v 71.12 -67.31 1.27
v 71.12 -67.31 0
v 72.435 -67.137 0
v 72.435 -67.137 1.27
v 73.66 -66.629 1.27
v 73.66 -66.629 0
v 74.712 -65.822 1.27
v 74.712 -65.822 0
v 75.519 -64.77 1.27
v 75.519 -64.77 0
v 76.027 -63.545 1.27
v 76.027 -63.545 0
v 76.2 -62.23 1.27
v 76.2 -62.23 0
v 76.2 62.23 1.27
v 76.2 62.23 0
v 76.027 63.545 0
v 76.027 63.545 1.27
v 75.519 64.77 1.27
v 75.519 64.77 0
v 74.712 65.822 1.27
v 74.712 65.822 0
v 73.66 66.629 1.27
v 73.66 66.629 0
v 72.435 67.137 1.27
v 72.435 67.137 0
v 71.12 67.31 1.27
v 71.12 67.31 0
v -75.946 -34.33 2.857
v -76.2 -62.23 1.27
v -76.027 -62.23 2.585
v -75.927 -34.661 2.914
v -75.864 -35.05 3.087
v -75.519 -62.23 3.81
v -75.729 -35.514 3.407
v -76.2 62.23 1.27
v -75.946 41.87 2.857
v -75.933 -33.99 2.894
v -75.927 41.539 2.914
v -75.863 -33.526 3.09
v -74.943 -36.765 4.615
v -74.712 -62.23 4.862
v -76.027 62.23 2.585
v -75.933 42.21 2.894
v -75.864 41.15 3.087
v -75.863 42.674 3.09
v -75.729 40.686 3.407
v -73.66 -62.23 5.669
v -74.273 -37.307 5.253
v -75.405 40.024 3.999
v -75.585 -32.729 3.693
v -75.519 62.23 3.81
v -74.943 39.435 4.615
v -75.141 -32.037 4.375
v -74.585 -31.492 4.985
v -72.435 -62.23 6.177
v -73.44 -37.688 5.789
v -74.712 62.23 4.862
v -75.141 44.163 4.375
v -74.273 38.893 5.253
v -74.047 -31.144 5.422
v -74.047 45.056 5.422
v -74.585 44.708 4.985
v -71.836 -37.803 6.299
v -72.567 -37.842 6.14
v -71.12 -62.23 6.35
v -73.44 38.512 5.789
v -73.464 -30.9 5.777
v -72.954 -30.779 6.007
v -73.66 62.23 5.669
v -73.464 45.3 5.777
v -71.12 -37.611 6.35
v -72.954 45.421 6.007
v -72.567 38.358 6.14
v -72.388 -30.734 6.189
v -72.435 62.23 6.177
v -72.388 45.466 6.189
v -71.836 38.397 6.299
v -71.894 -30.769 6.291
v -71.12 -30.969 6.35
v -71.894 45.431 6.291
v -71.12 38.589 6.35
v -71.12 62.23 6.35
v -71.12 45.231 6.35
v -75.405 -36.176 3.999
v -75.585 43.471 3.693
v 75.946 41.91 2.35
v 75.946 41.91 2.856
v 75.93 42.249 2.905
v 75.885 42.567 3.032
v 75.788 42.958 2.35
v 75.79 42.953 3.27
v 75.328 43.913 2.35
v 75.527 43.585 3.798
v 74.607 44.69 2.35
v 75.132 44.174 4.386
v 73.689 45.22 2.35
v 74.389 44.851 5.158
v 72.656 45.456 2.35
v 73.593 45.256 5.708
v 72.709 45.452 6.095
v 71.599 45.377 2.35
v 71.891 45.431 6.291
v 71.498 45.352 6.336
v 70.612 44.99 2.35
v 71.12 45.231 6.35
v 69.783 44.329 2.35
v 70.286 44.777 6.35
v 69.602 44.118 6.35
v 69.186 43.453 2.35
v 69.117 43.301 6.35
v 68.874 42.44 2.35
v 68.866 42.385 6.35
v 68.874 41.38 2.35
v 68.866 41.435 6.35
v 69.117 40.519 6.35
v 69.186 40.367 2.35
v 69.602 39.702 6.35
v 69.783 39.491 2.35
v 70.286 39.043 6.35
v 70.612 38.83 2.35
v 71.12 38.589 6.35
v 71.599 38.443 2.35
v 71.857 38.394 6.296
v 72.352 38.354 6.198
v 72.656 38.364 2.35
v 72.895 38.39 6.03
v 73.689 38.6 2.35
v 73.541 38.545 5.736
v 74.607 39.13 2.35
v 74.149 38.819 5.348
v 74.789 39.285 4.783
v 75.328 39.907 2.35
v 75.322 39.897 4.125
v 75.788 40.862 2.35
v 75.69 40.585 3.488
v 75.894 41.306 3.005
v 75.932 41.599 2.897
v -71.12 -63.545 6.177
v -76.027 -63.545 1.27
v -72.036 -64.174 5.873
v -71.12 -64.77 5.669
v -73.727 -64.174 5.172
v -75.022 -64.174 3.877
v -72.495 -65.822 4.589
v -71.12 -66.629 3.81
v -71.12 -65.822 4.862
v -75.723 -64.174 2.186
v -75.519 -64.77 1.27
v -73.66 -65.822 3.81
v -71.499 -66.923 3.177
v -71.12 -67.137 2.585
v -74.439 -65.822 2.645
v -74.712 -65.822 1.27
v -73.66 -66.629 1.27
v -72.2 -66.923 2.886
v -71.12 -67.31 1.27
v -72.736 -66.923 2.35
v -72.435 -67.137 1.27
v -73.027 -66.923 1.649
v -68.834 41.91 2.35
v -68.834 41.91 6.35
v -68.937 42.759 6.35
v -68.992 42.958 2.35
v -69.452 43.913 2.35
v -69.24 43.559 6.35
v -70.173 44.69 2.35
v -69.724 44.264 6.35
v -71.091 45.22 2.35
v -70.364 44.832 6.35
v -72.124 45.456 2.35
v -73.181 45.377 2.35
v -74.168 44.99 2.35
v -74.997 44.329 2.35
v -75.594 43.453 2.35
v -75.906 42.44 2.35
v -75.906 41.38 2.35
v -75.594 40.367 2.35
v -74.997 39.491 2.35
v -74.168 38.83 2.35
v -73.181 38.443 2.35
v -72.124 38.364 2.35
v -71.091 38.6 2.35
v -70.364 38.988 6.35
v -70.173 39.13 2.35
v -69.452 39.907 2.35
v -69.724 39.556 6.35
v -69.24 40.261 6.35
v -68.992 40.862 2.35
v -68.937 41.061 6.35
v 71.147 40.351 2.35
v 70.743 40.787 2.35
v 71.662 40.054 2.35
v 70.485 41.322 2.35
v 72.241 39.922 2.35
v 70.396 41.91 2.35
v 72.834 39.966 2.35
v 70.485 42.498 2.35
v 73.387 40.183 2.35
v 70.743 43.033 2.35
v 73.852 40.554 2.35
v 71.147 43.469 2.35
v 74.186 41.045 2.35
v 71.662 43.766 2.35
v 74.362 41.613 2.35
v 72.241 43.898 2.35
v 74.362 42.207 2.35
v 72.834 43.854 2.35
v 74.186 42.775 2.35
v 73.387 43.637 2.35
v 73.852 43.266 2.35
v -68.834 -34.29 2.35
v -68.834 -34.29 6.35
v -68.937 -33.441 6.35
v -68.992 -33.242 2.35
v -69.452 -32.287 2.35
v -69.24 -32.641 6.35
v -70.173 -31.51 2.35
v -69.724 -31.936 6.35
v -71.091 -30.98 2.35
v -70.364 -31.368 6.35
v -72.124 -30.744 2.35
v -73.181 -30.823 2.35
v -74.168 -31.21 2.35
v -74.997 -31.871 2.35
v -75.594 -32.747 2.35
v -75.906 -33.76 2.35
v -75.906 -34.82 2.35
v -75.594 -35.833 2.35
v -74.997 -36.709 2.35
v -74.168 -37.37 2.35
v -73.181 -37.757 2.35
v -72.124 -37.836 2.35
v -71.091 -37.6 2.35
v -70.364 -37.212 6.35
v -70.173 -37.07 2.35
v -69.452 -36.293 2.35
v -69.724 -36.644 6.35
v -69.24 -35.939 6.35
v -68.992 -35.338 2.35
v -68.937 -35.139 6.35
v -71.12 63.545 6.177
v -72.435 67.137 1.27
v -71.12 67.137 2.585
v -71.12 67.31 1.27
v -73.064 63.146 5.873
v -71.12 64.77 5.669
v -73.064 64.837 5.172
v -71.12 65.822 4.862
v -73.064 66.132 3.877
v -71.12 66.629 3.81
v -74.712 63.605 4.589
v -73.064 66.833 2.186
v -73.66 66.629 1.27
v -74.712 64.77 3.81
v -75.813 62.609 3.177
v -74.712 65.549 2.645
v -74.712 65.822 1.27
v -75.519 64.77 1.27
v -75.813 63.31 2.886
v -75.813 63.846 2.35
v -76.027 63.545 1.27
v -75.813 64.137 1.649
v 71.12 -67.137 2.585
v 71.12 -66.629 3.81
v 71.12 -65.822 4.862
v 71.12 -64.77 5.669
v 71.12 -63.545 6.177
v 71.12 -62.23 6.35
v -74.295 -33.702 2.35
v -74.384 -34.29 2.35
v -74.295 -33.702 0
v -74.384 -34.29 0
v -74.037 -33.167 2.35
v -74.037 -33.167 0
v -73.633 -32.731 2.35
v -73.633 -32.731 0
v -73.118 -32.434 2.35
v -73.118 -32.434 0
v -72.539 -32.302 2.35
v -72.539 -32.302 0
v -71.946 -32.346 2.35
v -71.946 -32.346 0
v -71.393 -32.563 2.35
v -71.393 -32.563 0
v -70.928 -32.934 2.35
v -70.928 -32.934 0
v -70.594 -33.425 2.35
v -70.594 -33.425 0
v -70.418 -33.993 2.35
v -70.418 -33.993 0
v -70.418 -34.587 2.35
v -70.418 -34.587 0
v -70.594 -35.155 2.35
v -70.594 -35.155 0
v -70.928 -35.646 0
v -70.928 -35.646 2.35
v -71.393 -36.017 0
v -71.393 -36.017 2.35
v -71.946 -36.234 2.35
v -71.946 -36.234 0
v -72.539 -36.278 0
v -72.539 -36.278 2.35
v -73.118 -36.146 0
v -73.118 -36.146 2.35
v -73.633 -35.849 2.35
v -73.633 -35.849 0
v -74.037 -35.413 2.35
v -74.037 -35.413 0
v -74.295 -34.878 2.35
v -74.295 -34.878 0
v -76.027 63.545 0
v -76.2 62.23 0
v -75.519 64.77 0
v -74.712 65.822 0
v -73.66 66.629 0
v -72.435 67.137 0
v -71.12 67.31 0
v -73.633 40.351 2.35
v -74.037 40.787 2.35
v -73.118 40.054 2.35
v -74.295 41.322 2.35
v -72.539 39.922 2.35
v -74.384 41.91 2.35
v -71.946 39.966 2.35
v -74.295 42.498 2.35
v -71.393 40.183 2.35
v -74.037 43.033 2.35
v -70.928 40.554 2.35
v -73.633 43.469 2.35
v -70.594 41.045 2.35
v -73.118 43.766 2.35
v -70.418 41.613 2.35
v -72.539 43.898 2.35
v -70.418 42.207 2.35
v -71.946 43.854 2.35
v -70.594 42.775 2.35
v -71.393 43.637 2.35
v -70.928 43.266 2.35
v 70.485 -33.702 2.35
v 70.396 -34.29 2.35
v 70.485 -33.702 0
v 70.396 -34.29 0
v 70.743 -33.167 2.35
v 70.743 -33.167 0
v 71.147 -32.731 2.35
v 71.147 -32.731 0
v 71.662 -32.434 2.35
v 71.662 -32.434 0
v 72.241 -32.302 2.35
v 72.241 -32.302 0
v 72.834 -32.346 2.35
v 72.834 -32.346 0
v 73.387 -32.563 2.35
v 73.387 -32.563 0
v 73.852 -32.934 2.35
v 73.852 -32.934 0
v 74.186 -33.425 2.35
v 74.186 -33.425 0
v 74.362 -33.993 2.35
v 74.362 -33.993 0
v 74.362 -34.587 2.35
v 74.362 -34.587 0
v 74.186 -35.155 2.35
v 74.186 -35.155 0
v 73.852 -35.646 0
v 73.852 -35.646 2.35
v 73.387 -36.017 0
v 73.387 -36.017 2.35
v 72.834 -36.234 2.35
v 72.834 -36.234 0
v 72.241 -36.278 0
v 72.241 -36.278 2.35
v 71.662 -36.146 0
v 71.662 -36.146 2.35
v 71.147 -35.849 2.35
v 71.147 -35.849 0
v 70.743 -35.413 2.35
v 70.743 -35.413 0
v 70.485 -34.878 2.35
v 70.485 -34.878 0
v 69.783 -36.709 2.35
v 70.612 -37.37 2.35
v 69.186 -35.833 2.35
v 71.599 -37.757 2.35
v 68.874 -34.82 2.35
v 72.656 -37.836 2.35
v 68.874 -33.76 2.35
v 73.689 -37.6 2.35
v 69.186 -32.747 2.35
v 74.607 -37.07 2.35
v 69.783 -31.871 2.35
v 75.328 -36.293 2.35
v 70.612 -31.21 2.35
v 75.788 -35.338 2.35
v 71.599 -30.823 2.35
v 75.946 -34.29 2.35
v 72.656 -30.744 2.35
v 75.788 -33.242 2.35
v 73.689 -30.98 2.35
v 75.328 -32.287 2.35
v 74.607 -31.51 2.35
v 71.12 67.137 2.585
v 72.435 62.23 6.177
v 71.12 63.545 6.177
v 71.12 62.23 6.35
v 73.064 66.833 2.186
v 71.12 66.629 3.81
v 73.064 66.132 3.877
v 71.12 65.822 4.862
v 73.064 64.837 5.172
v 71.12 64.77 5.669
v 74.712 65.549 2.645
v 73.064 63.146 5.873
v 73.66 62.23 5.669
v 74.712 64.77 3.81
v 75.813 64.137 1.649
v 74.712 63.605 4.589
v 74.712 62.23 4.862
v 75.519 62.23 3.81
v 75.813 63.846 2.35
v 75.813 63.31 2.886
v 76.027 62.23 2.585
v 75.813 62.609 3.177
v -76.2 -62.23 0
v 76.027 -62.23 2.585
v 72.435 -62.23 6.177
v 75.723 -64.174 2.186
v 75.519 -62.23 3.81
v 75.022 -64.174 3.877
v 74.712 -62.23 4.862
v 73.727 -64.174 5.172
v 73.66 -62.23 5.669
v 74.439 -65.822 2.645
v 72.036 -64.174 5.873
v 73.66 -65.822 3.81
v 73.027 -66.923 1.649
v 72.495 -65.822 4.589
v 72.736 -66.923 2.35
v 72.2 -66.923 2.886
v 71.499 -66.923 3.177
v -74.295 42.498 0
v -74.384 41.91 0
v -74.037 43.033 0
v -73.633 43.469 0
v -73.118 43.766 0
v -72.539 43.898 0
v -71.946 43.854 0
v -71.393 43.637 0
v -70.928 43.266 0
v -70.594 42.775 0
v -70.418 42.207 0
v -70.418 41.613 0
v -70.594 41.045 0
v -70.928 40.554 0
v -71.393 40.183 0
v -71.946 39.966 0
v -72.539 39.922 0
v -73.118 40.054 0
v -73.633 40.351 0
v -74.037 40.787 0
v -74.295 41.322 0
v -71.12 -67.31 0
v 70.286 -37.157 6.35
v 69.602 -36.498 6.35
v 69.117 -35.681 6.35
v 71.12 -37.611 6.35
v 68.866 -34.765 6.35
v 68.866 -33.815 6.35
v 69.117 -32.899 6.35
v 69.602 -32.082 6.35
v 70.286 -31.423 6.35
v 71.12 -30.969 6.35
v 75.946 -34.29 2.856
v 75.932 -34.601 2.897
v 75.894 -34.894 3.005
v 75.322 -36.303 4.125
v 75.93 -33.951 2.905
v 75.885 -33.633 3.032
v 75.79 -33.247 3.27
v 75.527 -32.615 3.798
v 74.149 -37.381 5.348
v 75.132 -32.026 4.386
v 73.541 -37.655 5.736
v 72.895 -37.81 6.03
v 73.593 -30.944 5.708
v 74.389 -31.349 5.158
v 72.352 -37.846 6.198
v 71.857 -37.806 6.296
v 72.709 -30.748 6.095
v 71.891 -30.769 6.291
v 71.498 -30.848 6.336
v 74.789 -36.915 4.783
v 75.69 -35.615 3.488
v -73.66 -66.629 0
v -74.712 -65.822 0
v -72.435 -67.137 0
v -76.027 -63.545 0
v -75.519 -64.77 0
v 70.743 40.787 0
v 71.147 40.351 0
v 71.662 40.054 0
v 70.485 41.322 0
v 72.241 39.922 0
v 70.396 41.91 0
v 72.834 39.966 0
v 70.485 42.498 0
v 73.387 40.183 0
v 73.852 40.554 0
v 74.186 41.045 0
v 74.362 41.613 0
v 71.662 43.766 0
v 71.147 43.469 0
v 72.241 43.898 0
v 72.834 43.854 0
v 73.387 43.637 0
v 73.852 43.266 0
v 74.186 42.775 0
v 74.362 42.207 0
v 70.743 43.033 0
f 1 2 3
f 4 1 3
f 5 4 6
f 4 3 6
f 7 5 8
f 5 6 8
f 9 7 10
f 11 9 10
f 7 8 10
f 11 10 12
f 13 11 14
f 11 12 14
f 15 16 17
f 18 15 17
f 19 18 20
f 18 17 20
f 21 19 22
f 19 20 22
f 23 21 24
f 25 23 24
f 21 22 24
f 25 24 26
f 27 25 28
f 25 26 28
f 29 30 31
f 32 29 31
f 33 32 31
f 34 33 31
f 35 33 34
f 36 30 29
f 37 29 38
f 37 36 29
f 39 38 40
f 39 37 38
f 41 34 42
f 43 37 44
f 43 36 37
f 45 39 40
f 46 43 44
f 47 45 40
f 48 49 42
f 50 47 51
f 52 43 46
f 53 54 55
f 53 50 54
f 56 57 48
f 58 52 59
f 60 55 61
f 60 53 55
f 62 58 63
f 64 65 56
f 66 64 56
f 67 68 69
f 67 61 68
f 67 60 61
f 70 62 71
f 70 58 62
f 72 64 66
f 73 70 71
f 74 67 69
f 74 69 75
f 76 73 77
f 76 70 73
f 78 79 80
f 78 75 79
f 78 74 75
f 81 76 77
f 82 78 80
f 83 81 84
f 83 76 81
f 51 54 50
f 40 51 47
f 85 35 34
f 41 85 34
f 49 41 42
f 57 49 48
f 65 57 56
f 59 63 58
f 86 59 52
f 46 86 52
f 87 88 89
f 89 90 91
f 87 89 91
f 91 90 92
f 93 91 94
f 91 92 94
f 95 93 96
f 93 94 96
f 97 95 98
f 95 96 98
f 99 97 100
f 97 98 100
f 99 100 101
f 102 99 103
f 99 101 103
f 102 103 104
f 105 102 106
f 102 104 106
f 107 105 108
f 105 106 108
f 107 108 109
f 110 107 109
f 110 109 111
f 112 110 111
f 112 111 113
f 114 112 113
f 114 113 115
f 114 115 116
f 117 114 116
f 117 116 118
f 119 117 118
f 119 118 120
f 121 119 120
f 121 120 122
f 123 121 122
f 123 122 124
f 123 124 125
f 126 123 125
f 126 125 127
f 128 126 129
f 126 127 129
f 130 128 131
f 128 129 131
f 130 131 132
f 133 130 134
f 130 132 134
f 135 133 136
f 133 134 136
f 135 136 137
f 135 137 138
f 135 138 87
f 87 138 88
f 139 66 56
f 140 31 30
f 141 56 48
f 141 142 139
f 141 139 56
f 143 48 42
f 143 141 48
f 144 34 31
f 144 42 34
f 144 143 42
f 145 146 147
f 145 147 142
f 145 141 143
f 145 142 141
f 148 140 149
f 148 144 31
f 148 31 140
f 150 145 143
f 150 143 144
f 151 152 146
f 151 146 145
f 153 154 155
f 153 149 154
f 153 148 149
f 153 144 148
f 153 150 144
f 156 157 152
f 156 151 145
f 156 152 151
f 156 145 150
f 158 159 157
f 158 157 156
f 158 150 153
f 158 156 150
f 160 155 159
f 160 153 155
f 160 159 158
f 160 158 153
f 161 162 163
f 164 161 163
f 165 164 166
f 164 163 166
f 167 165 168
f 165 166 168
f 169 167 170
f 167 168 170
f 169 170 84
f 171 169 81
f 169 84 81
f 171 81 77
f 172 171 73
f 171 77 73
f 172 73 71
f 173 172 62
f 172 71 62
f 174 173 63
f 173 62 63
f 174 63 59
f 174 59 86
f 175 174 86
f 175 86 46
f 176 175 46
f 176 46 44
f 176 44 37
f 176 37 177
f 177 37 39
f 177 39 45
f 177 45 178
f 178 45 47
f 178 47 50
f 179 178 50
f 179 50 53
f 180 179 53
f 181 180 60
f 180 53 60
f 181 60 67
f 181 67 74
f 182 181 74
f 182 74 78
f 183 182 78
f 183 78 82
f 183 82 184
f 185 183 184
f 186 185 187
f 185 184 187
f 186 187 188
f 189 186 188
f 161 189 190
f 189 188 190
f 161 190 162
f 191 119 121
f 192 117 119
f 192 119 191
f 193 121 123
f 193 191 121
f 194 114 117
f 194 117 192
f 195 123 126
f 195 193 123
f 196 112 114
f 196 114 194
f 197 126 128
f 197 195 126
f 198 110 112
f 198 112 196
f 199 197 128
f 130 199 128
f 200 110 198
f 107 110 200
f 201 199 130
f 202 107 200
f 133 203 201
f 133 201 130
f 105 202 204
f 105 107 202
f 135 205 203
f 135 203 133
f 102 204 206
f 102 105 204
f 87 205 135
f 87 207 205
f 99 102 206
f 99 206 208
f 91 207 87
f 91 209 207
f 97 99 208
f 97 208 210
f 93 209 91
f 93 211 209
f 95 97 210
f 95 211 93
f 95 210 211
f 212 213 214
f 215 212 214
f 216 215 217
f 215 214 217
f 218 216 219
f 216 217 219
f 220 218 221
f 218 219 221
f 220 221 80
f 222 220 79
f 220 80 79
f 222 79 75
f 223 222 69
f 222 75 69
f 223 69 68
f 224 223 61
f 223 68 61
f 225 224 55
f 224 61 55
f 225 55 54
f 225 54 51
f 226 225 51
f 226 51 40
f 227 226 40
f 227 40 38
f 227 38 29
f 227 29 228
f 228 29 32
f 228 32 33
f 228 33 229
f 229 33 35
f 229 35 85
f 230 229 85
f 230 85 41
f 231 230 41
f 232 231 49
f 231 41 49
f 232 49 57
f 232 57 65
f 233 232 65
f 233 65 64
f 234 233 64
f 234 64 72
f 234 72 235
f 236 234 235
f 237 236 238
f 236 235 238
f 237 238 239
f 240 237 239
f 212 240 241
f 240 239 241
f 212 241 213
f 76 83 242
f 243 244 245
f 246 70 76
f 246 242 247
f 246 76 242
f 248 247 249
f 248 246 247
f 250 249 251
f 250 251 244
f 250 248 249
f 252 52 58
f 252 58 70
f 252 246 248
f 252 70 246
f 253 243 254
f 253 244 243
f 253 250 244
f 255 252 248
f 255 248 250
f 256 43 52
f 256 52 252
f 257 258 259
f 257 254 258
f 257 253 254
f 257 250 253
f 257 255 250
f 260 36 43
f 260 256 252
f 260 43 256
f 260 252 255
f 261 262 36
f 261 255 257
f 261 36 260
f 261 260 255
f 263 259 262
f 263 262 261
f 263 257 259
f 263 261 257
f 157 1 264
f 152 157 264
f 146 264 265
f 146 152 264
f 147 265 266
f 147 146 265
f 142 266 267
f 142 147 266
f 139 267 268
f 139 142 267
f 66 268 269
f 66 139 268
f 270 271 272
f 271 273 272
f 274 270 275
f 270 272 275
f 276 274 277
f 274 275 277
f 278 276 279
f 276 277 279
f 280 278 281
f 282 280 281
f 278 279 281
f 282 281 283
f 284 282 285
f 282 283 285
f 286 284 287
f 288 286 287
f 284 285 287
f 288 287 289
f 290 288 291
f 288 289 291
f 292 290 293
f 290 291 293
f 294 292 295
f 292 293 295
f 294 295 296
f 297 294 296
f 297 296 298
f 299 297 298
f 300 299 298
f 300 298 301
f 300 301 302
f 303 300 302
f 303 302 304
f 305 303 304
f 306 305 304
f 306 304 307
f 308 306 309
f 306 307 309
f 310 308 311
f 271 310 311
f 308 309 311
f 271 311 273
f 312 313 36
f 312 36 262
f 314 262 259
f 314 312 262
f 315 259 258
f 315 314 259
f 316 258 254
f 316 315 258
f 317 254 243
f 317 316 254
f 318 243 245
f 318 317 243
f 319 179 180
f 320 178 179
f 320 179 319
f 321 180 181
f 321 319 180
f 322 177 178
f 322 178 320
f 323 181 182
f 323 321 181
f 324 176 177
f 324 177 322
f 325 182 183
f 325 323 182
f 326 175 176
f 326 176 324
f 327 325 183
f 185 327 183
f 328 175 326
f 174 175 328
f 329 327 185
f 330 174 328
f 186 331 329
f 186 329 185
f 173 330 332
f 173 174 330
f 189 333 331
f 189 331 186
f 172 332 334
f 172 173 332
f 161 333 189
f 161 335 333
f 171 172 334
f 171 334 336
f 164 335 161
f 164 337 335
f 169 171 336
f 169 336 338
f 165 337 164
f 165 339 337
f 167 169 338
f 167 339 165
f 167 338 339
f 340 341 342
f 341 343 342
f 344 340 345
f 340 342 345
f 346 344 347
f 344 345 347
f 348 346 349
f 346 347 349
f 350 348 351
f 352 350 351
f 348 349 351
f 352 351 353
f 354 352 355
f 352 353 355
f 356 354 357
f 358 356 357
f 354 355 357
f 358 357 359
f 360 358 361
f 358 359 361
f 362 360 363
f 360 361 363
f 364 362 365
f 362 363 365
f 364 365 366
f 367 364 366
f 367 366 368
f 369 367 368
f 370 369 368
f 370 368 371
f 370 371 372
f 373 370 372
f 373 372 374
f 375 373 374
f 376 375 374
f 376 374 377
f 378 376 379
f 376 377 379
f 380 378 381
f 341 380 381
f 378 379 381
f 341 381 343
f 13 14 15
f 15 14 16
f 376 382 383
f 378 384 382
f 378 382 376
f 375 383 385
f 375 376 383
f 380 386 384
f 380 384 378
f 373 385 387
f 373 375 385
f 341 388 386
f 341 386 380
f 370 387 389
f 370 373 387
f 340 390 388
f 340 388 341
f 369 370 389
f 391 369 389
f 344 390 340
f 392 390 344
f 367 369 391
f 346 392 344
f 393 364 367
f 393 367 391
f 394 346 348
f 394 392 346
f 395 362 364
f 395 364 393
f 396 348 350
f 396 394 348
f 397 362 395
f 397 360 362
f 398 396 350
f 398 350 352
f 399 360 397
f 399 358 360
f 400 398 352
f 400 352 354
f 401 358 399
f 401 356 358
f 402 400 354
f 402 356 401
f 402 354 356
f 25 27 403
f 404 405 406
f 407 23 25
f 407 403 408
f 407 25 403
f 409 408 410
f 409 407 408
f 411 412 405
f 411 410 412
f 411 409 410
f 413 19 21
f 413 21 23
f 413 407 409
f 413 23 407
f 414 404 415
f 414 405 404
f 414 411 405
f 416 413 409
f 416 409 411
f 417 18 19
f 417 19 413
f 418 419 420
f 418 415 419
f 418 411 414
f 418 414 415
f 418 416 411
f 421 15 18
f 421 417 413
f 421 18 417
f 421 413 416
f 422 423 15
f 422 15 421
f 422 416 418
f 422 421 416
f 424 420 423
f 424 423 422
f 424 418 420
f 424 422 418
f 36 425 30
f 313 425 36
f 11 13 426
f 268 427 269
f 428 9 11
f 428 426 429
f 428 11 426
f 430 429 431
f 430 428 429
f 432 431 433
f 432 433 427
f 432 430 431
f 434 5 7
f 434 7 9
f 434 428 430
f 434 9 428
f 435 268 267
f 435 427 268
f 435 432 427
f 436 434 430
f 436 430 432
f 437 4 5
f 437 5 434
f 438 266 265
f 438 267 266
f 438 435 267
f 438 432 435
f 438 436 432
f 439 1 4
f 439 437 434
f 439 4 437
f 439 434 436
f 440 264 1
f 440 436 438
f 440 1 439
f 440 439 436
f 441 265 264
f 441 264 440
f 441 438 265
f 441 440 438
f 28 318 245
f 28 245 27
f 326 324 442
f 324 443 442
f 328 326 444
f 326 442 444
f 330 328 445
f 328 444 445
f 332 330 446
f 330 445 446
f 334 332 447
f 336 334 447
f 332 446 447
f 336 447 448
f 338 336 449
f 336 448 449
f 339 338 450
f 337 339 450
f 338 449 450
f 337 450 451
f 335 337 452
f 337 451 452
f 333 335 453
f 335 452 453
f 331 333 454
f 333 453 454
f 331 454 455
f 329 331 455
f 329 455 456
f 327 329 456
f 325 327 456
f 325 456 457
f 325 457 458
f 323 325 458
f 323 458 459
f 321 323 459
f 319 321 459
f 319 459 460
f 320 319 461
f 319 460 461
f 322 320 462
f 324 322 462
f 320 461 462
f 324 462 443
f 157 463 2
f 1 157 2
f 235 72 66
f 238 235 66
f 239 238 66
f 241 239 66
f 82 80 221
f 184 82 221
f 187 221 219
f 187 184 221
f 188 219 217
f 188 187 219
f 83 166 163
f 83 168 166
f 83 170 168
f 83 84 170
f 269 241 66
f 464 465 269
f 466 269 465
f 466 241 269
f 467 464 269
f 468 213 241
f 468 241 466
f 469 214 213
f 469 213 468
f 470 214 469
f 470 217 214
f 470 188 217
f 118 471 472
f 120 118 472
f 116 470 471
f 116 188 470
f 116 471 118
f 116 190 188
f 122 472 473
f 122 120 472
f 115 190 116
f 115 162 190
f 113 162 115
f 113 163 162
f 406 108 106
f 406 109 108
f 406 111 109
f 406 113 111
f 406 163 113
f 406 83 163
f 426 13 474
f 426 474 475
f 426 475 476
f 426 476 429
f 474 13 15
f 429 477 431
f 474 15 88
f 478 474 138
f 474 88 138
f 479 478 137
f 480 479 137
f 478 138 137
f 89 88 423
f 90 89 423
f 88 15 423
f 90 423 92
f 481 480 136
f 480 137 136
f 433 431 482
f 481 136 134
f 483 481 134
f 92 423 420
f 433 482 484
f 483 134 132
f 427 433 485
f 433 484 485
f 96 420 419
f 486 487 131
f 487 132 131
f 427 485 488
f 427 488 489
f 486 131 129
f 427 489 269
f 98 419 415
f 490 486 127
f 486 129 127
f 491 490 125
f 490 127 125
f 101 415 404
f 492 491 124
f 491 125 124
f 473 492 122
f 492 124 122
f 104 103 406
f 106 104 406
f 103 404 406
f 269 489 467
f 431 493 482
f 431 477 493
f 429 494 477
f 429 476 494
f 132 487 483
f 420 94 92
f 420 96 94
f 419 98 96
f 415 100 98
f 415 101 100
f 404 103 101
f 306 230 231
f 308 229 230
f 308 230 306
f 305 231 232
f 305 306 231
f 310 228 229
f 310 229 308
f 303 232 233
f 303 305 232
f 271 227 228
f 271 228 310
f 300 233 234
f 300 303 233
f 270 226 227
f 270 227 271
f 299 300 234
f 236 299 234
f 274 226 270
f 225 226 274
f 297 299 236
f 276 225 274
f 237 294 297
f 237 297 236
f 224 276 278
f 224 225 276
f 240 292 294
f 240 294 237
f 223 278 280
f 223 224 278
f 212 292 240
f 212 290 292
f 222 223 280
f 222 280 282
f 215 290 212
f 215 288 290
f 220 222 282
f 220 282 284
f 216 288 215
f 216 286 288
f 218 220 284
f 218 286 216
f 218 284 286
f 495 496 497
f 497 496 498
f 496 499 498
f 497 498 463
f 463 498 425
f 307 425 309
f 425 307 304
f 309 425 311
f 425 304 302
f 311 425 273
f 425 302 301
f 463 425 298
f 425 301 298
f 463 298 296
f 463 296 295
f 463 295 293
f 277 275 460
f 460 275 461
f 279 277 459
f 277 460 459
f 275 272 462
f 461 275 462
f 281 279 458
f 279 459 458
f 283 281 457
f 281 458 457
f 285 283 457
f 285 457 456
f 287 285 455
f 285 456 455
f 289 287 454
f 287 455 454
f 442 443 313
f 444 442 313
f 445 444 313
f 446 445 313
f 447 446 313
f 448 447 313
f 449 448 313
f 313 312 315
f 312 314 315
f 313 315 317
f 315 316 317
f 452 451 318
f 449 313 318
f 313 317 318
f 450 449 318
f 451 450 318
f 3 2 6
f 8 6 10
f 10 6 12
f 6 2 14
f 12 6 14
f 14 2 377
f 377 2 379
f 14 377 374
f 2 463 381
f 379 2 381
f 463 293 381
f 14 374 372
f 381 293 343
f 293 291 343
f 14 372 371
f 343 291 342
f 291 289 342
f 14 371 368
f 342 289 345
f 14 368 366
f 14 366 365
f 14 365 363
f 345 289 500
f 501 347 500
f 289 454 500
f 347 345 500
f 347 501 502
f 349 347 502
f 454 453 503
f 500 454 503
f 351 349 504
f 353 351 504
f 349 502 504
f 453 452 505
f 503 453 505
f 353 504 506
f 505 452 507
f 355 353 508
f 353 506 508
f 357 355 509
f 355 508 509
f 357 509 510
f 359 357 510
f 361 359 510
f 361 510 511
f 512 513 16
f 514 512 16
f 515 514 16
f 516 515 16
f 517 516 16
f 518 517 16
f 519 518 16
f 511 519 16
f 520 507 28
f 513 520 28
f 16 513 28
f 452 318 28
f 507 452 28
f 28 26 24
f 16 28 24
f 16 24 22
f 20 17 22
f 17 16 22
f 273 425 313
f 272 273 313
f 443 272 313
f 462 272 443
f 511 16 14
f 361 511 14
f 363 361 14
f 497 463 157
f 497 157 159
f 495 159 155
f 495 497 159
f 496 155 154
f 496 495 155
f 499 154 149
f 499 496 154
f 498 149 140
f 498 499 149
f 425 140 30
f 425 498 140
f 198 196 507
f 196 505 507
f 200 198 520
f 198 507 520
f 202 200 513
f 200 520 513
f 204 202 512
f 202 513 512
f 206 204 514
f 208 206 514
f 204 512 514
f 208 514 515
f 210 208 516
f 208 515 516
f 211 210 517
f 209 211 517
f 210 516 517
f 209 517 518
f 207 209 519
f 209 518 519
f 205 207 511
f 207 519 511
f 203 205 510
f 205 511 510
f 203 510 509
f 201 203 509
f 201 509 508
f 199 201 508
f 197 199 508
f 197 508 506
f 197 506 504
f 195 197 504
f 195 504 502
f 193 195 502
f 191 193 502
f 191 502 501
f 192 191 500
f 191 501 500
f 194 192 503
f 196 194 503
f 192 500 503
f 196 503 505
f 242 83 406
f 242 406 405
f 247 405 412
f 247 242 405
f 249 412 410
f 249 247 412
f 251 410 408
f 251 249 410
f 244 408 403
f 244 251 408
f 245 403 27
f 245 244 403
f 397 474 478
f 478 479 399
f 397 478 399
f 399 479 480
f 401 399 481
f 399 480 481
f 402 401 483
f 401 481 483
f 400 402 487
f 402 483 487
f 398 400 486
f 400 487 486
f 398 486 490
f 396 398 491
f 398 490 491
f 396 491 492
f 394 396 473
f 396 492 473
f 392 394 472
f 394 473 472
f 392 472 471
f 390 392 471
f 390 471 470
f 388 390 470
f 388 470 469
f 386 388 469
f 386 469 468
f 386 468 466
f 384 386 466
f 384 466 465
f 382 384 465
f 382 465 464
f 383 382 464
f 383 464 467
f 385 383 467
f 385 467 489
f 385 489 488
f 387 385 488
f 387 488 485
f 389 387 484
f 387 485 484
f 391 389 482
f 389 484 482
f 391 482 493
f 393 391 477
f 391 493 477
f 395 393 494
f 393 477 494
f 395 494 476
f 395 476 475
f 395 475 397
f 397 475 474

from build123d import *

# Parameters (mm, degrees)
F0_W           = 152.4
F0_H           = 134.62
F1_DEPTH       = 6.35
F3_D           = 3.9878
F3_CBORE_D     = 7.112
F3_CBORE_DEPTH = 4.000000001
F4_T1_DEPTH    = 124.46
F4_T3_DEPTH    = 142.24
F4_T5_DEPTH    = 13.97
F4_S9_W        = 5.08
F4_S9_H        = 5.08
F4_T10_DEPTH   = 5.08
F4_S15_W       = 5.08
F4_S15_H       = 5.08
F4_T16_DEPTH   = 5.08
F4_S21_W       = 5.08
F4_S21_H       = 5.08
F4_T22_DEPTH   = 5.08
F4_S27_W       = 5.08
F4_S27_H       = 5.08
F4_T28_DEPTH   = 5.08


# Not quite as in the source:
# - a fillet or chamfer that OpenCascade refuses, or shapes differently, is made with other operations: its cross-section is extruded or revolved along the edge and cut away or added
# - a feature names something its author has since deleted; it is built from what else it names


with BuildPart() as f1:
    # F0 (on Top) → F1 (new body)
    with BuildSketch(Plane.XY):
        Rectangle(F0_W, F0_H)
    extrude(amount=F1_DEPTH)

    # F3 (through all)
    with Locations(Plane.XY.offset(6.35)):
        with Locations((-72.39, 41.91), (-72.39, -34.29), (72.39, -34.29), (72.39, 41.91)):
            CounterBoreHole(F3_D / 2, F3_CBORE_D / 2, F3_CBORE_DEPTH)

    # F4: fillet of radius 5.08 on 8 edges, made by hand

    # F4_s2 → F4_t1 (cut)
    with BuildSketch(Plane.XZ.offset(-62.23)):
        with BuildLine():
            ThreePointArc((-76.2, 1.27), (-74.7121024484, 4.8621024484), (-71.12, 6.35))
            Line((-71.12, 6.35), (-76.2, 6.35))
            Line((-76.2, 6.35), (-76.2, 1.27))
        make_face()
        with BuildLine():
            ThreePointArc((76.2, 1.27), (74.7121024484, 4.8621024484), (71.12, 6.35))
            Line((71.12, 6.35), (76.2, 6.35))
            Line((76.2, 6.35), (76.2, 1.27))
        make_face()
    extrude(amount=F4_T1_DEPTH, mode=Mode.SUBTRACT)

    # F4_s4 → F4_t3 (cut)
    with BuildSketch(Plane.YZ.offset(-71.12)):
        with BuildLine():
            ThreePointArc((62.23, 6.35), (65.8221024484, 4.8621024484), (67.31, 1.27))
            Line((67.31, 1.27), (67.31, 6.35))
            Line((67.31, 6.35), (62.23, 6.35))
        make_face()
        with BuildLine():
            ThreePointArc((-67.31, 1.27), (-65.8221024484, 4.8621024484), (-62.23, 6.35))
            Line((-62.23, 6.35), (-67.31, 6.35))
            Line((-67.31, 6.35), (-67.31, 1.27))
        make_face()
    extrude(amount=F4_T3_DEPTH, mode=Mode.SUBTRACT)

    # F4_s6 → F4_t5 (cut)
    with BuildSketch(Plane.XY.offset(-12.7)):
        with BuildLine():
            ThreePointArc((-71.12, -67.31), (-74.7121024484, -65.8221024484), (-76.2, -62.23))
            Line((-76.2, -62.23), (-76.2, -67.31))
            Line((-76.2, -67.31), (-71.12, -67.31))
        make_face()
        with BuildLine():
            ThreePointArc((71.12, -67.31), (74.7121024484, -65.8221024484), (76.2, -62.23))
            Line((76.2, -62.23), (76.2, -67.31))
            Line((76.2, -67.31), (71.12, -67.31))
        make_face()
        with BuildLine():
            ThreePointArc((76.2, 62.23), (74.7121024484, 65.8221024484), (71.12, 67.31))
            Line((71.12, 67.31), (76.2, 67.31))
            Line((76.2, 67.31), (76.2, 62.23))
        make_face()
        with BuildLine():
            ThreePointArc((-76.2, 62.23), (-74.7121024484, 65.8221024484), (-71.12, 67.31))
            Line((-71.12, 67.31), (-76.2, 67.31))
            Line((-76.2, 67.31), (-76.2, 62.23))
        make_face()
    extrude(amount=F4_T5_DEPTH, mode=Mode.SUBTRACT)


with BuildPart() as f4_tool8:
    # F4_s9 → F4_t10 (new body)
    with BuildSketch(Plane.YZ.offset(-71.12)):
        with Locations((64.77, 3.81)):
            Rectangle(F4_S9_W, F4_S9_H)
    extrude(amount=-F4_T10_DEPTH)

    # F4_s11 → F4_t12 (revolve, cut)
    with BuildSketch(Plane(origin=(-71.12, 62.23, 1.27), x_dir=(0, -0.7071067812, -0.7071067812), z_dir=(0, 0.7071067812, -0.7071067812))):
        with BuildLine():
            ThreePointArc((0, -5.08), (5.08, 0), (0, 5.08))
            Line((0, 5.08), (0, -5.08))
        make_face()
    revolve(axis=Axis((-71.12, 62.23, 1.27), (-1, 0, 0)), mode=Mode.SUBTRACT)


with BuildPart() as f1_1:
    add(f1.part)

    # F4_t7: cut F4_tool8
    add(f4_tool8.part, mode=Mode.SUBTRACT)


with BuildPart() as f4_tool14:
    # F4_s15 → F4_t16 (new body)
    with BuildSketch(Plane.XZ.offset(62.23)):
        with Locations((-73.66, 3.81)):
            Rectangle(F4_S15_W, F4_S15_H)
    extrude(amount=F4_T16_DEPTH)

    # F4_s17 → F4_t18 (revolve, cut)
    with BuildSketch(Plane(origin=(-71.12, -62.23, 1.27), x_dir=(0.7071067812, 0, -0.7071067812), z_dir=(-0.7071067812, 0, -0.7071067812))):
        with BuildLine():
            ThreePointArc((0, -5.08), (5.08, 0), (0, 5.08))
            Line((0, 5.08), (0, -5.08))
        make_face()
    revolve(axis=Axis((-71.12, -62.23, 1.27), (0, -1, 0)), mode=Mode.SUBTRACT)


with BuildPart() as f1_2:
    add(f1_1.part)

    # F4_t13: cut F4_tool14
    add(f4_tool14.part, mode=Mode.SUBTRACT)


with BuildPart() as f4_tool20:
    # F4_s21 → F4_t22 (new body)
    with BuildSketch(Plane.YZ.offset(71.12)):
        with Locations((64.77, 3.81)):
            Rectangle(F4_S21_W, F4_S21_H)
    extrude(amount=F4_T22_DEPTH)

    # F4_s23 → F4_t24 (revolve, cut)
    with BuildSketch(Plane(origin=(71.12, 62.23, 1.27), x_dir=(0, -0.7071067812, -0.7071067812), z_dir=(0, -0.7071067812, 0.7071067812))):
        with BuildLine():
            ThreePointArc((0, -5.08), (5.08, 0), (0, 5.08))
            Line((0, 5.08), (0, -5.08))
        make_face()
    revolve(axis=Axis((71.12, 62.23, 1.27), (1, 0, 0)), mode=Mode.SUBTRACT)


with BuildPart() as f1_3:
    add(f1_2.part)

    # F4_t19: cut F4_tool20
    add(f4_tool20.part, mode=Mode.SUBTRACT)


with BuildPart() as f4_tool26:
    # F4_s27 → F4_t28 (new body)
    with BuildSketch(Plane.XZ.offset(62.23)):
        with Locations((73.66, 3.81)):
            Rectangle(F4_S27_W, F4_S27_H)
    extrude(amount=F4_T28_DEPTH)

    # F4_s29 → F4_t30 (revolve, cut)
    with BuildSketch(Plane(origin=(71.12, -62.23, 1.27), x_dir=(-0.7071067812, 0, -0.7071067812), z_dir=(-0.7071067812, 0, 0.7071067812))):
        with BuildLine():
            ThreePointArc((0, -5.08), (5.08, 0), (0, 5.08))
            Line((0, 5.08), (0, -5.08))
        make_face()
    revolve(axis=Axis((71.12, -62.23, 1.27), (0, -1, 0)), mode=Mode.SUBTRACT)


with BuildPart() as f1_4:
    add(f1_3.part)

    # F4_t25: cut F4_tool26
    add(f4_tool26.part, mode=Mode.SUBTRACT)


solid = f1_4.part
